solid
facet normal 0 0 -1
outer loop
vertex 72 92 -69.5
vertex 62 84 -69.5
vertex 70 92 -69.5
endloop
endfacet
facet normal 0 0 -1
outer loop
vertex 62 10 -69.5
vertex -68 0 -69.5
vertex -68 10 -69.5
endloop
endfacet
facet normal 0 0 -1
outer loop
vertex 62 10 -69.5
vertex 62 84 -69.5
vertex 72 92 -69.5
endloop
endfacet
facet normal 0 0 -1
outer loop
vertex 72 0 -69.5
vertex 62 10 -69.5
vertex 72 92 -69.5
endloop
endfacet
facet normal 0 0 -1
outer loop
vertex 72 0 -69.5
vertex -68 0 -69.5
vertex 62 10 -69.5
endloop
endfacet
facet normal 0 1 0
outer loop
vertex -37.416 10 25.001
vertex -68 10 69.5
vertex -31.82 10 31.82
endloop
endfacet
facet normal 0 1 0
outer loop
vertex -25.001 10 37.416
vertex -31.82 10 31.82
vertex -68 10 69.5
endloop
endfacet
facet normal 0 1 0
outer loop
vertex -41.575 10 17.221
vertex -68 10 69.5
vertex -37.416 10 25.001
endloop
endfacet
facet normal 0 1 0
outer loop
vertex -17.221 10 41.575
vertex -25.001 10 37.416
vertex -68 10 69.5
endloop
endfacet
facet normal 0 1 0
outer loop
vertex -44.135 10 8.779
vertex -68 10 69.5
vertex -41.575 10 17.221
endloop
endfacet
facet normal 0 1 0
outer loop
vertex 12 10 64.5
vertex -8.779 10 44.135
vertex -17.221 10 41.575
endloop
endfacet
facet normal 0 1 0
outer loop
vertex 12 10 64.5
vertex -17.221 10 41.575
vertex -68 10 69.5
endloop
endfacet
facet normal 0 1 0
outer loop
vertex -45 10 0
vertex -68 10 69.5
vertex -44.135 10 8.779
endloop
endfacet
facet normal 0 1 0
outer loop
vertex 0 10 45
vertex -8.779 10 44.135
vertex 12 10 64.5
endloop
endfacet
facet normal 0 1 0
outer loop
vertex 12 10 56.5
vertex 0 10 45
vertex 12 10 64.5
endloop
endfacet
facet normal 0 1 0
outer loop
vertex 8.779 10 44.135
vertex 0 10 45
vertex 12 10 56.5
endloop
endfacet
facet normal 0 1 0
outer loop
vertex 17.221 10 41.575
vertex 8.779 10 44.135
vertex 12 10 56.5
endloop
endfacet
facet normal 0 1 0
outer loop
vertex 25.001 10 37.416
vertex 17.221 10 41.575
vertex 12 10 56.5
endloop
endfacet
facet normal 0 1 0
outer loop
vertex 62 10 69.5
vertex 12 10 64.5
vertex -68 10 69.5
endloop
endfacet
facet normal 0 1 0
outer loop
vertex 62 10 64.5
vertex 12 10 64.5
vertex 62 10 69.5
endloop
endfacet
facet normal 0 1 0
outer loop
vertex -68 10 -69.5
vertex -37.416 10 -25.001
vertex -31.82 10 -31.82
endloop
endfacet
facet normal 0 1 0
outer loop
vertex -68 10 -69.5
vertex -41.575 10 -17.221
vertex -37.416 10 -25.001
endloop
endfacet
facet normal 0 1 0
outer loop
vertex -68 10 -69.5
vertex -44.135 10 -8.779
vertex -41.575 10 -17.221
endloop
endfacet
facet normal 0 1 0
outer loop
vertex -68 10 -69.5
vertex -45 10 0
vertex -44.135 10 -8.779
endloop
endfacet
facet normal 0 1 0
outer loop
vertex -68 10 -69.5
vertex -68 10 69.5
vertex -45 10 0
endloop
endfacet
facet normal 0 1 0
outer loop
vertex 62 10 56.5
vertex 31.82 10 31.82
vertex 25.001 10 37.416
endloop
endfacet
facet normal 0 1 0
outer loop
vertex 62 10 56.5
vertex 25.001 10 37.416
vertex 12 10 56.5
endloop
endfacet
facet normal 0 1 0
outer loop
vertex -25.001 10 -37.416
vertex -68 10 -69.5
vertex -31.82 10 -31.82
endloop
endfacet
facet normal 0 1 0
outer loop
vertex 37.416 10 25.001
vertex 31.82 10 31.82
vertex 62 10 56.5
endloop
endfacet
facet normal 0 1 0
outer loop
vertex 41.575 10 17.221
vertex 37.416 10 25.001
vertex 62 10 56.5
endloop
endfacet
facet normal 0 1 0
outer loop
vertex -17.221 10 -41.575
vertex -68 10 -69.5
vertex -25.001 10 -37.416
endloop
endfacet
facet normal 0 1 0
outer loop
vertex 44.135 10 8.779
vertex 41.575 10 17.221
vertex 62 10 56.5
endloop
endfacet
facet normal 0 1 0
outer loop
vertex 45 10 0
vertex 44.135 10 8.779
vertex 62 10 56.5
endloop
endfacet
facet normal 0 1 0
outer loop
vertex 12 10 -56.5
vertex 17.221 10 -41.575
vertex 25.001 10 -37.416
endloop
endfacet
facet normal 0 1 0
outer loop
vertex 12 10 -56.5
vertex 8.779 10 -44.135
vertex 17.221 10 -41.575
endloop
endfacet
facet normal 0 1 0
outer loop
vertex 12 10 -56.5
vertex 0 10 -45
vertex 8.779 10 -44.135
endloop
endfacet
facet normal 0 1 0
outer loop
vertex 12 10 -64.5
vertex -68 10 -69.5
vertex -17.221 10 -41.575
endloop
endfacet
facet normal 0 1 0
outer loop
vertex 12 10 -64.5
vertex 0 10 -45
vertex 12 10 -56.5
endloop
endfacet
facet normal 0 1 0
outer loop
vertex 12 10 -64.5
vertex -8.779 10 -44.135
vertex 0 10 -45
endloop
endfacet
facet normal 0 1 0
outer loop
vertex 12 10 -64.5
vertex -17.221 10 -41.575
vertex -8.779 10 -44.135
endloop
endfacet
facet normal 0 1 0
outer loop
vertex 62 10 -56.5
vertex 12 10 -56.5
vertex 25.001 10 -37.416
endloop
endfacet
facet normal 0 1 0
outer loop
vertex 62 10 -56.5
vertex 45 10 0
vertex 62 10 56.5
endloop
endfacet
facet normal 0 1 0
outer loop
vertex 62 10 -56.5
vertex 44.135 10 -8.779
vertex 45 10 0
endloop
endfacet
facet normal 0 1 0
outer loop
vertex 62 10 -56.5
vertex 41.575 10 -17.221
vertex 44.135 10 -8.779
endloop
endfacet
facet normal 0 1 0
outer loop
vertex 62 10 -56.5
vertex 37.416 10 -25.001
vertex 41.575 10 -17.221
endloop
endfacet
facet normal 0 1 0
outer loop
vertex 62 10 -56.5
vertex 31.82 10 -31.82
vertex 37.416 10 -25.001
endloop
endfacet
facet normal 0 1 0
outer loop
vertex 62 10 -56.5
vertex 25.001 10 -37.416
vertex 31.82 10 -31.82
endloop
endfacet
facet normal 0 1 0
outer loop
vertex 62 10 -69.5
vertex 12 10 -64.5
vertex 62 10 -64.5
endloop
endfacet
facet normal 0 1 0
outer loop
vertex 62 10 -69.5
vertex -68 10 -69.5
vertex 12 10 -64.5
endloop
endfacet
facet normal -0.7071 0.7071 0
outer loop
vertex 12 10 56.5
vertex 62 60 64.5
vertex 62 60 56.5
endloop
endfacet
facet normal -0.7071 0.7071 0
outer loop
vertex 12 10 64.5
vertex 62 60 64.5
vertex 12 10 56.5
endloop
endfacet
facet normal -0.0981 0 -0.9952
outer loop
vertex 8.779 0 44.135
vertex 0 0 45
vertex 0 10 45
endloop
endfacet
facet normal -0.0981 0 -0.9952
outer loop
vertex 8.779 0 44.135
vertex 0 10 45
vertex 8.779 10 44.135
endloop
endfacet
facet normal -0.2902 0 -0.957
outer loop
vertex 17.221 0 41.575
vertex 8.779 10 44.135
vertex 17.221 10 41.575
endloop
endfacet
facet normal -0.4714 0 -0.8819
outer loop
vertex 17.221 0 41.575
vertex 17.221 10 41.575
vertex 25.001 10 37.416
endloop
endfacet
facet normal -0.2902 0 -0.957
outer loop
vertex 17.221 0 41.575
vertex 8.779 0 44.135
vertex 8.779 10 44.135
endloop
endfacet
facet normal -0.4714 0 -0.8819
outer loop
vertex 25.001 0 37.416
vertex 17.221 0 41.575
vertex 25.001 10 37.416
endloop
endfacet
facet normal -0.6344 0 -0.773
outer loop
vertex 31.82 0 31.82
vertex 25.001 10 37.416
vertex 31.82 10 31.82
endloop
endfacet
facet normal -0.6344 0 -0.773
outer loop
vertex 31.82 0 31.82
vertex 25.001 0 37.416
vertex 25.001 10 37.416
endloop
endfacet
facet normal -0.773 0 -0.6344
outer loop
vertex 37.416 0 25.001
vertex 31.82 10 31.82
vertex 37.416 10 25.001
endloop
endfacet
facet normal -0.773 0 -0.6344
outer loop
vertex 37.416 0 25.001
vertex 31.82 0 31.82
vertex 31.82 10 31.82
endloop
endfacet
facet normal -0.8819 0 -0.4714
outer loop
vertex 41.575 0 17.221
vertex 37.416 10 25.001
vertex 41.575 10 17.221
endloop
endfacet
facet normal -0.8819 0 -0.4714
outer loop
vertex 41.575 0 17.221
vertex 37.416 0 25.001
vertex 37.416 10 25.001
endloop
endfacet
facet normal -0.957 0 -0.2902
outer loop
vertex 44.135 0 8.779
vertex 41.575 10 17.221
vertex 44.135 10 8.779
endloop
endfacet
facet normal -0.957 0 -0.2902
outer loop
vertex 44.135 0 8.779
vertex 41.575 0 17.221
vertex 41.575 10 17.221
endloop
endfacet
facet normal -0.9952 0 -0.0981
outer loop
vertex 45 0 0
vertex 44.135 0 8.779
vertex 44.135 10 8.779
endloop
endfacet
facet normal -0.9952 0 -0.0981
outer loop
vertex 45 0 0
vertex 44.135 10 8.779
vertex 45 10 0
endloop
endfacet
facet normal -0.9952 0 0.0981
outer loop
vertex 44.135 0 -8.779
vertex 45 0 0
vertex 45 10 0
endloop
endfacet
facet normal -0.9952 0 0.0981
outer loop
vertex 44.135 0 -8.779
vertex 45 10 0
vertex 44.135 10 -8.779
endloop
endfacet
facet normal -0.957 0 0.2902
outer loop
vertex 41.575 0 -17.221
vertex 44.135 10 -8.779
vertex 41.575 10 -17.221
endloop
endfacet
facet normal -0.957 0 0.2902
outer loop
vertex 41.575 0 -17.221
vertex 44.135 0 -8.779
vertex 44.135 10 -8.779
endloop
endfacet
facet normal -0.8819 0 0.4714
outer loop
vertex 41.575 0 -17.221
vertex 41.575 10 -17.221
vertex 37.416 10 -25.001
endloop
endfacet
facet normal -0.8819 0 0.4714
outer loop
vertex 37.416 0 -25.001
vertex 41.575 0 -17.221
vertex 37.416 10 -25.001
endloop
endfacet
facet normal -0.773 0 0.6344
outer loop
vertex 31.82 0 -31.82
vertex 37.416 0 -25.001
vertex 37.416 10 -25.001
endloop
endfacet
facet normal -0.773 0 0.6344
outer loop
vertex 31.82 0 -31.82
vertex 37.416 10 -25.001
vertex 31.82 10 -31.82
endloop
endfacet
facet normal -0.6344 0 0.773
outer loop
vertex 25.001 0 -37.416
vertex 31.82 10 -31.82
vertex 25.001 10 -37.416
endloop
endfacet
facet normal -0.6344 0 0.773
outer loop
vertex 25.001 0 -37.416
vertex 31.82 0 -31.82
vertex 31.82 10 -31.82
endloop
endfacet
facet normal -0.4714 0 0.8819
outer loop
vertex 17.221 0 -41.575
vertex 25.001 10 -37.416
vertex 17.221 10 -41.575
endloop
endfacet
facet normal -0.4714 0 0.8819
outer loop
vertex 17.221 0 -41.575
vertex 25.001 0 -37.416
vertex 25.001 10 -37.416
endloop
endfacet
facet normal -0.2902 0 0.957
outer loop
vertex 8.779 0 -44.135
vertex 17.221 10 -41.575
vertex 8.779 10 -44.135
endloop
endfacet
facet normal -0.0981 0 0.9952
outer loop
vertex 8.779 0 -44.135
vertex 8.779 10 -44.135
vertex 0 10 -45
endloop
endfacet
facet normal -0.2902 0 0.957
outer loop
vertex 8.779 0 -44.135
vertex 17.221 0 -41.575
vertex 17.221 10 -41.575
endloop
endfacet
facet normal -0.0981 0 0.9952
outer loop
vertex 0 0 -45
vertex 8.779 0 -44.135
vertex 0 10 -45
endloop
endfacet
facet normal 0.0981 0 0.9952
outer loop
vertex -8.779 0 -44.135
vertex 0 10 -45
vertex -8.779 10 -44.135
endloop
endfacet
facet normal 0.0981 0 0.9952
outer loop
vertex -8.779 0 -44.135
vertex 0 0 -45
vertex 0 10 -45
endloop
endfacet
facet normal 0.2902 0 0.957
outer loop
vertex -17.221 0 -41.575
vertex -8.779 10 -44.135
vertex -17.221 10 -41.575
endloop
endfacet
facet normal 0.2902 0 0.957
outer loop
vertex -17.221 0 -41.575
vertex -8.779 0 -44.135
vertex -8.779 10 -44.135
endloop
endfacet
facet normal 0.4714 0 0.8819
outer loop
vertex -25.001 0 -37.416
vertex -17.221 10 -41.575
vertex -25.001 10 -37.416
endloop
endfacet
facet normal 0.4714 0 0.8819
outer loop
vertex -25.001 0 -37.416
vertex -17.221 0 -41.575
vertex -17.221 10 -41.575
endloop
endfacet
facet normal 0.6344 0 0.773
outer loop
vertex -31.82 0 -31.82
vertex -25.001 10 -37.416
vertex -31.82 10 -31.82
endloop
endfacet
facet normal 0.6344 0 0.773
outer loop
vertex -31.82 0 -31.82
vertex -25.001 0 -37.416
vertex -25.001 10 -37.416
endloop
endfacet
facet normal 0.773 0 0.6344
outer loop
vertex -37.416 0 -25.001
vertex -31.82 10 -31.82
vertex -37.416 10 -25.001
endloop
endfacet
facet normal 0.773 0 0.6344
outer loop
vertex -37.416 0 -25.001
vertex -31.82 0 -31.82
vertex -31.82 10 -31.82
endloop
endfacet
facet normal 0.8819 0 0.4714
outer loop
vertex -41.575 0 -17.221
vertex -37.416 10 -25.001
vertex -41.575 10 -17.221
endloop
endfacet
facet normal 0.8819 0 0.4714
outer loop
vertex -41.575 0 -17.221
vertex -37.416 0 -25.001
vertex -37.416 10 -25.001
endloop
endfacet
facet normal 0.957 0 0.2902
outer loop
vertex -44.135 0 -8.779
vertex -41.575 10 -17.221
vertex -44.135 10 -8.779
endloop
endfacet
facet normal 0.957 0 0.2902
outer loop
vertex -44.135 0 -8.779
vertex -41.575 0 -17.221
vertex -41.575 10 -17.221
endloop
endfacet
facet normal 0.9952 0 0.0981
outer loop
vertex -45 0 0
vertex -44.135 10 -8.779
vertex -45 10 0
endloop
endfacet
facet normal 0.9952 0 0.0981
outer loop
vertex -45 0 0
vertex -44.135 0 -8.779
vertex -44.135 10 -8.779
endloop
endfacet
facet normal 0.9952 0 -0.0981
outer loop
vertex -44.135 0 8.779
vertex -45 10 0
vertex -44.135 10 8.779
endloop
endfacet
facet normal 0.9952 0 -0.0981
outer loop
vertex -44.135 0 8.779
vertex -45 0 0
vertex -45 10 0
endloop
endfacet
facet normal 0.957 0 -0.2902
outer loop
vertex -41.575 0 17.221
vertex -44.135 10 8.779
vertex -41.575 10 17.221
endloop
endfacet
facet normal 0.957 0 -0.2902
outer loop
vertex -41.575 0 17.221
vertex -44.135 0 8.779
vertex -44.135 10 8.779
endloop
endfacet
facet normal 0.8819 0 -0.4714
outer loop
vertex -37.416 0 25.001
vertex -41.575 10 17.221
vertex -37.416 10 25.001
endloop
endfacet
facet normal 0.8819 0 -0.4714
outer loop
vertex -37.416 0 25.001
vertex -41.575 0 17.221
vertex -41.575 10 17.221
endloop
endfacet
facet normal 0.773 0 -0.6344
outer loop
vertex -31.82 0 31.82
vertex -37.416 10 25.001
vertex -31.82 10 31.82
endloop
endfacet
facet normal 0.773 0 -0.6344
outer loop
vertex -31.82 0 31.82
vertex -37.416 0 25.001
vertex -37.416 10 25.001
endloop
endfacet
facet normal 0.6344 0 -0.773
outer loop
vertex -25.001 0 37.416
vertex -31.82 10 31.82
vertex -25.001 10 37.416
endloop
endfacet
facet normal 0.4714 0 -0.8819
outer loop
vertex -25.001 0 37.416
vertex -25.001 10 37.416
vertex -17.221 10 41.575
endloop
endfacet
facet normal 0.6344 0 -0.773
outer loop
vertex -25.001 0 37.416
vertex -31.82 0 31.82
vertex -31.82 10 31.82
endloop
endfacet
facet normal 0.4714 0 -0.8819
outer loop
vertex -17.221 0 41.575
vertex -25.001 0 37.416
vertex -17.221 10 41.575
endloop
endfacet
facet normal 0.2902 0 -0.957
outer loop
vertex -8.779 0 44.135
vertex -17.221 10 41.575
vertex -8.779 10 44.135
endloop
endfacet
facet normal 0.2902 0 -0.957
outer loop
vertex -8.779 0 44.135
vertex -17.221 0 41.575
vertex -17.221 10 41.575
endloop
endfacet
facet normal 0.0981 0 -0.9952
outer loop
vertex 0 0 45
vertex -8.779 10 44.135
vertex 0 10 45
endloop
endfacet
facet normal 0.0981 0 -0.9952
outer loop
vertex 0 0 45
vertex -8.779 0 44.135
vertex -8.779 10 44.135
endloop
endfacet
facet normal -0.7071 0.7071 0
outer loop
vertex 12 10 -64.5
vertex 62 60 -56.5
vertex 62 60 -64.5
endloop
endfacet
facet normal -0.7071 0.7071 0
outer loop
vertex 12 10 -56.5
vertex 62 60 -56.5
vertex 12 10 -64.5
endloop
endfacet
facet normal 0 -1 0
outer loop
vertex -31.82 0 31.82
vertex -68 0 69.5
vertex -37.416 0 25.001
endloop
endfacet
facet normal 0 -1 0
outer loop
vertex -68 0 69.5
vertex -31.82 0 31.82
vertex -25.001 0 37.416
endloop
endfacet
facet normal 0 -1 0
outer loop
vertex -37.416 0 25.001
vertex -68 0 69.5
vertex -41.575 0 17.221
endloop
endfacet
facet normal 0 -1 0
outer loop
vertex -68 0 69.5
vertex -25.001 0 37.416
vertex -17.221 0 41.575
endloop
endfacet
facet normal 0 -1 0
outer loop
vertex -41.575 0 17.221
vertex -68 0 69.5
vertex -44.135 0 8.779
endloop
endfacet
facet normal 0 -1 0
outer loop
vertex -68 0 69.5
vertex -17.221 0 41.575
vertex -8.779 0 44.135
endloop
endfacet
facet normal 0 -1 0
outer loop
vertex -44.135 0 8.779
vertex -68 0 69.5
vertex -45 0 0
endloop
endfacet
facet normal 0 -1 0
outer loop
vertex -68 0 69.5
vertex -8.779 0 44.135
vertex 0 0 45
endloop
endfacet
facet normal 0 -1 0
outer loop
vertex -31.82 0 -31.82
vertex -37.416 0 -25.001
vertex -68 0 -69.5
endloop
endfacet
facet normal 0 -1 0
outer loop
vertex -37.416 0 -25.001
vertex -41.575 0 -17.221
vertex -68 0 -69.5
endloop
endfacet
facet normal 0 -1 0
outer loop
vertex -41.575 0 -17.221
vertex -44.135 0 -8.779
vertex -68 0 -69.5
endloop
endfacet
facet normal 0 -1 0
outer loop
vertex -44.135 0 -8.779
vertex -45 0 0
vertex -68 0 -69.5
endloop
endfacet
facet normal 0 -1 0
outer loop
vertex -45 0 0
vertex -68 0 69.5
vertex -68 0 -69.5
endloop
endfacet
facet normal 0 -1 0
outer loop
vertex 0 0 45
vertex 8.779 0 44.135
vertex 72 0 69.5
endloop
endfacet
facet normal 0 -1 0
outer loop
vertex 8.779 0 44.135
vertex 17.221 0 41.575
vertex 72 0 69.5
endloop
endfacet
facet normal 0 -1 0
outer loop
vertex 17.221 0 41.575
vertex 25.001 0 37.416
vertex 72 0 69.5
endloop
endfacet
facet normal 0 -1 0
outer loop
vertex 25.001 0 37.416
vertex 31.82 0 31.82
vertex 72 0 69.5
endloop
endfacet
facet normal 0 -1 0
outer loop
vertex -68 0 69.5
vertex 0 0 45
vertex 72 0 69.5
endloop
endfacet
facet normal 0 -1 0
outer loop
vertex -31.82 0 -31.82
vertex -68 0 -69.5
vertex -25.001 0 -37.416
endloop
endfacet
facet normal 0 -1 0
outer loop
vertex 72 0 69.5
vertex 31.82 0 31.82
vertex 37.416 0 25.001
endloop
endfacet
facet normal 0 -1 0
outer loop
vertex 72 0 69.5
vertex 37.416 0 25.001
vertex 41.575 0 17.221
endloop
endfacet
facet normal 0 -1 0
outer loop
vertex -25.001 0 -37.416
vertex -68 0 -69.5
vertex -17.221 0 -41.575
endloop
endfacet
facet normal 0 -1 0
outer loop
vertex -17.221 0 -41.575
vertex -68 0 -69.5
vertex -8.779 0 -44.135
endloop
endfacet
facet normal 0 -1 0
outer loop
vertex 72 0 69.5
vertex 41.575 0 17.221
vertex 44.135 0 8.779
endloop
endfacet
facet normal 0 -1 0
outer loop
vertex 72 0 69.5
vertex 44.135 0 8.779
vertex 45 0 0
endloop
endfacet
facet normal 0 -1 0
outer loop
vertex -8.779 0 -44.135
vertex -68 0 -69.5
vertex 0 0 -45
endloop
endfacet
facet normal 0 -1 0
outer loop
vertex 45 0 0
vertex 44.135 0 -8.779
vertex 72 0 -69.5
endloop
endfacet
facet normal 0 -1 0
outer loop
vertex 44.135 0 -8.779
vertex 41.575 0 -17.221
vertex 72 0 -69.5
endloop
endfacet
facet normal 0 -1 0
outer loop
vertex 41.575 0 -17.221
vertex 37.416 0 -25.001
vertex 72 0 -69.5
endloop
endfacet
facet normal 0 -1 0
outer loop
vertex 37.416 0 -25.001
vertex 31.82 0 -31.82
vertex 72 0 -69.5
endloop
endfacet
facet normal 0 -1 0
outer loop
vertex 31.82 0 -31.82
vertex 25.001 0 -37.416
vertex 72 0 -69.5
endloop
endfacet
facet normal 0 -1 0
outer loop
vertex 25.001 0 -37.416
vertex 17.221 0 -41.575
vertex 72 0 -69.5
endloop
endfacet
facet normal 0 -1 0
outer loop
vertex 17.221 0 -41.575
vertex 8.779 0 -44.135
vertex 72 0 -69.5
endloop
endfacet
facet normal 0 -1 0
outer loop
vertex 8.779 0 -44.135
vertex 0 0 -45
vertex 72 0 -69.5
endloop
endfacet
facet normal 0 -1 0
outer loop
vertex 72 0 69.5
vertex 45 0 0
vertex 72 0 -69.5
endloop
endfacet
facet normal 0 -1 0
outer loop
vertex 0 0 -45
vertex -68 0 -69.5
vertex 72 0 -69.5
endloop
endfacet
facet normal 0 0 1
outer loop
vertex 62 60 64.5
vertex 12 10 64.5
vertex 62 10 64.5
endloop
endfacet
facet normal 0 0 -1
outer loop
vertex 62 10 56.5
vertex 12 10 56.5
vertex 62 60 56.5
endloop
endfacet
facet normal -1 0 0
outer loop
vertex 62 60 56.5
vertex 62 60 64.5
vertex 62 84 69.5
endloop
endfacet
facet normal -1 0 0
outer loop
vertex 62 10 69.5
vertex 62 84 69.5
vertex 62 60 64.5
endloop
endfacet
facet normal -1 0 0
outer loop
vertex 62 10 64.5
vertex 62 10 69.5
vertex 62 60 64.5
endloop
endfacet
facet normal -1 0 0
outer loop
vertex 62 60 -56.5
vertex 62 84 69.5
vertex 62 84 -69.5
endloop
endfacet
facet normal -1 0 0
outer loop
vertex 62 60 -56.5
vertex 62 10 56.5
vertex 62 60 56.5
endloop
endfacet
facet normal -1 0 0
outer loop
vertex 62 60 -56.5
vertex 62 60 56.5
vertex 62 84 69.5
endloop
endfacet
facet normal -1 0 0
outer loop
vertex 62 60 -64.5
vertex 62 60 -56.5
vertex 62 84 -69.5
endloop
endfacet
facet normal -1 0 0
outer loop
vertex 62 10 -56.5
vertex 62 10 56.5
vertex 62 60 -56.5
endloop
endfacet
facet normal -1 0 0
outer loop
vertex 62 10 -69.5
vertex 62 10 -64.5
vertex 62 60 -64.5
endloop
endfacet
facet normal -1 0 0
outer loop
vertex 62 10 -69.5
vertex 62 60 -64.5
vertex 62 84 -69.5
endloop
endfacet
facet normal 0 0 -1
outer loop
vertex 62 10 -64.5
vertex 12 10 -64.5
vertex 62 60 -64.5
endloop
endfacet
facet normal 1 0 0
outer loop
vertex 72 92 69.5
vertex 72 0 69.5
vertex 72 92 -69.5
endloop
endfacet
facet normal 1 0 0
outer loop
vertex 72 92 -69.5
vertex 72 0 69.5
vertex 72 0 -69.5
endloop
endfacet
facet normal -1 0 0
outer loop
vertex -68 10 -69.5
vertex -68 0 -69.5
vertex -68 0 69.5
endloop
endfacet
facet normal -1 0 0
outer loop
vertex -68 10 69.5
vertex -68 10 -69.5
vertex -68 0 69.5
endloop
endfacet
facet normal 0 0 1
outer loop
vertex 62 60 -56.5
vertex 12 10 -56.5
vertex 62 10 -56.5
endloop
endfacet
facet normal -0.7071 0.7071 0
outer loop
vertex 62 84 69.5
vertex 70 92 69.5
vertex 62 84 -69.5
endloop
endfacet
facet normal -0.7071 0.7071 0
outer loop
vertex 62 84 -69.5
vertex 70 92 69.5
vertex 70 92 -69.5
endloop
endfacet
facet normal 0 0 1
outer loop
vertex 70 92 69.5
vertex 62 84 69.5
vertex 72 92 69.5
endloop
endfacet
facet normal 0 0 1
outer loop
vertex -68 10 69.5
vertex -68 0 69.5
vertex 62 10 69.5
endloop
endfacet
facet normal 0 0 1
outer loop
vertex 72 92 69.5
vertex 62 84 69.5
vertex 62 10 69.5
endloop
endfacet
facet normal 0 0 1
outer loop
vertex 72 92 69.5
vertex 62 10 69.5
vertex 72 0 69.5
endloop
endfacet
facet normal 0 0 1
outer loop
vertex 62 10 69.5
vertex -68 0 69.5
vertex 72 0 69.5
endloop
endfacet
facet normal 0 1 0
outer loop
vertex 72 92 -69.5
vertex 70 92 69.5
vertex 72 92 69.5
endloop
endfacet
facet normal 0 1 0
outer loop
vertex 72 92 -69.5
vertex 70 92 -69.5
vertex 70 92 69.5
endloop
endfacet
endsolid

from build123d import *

# Parameters (mm, degrees)
SKETCH1_R       = 45
EXTRUDE1_DEPTH  = 10
SKETCH2_W       = 10
SKETCH2_H       = 139
EXTRUDE2_DEPTH  = 82
CHAMFER1_SIZE   = 8
EXTRUDE3_START  = -5
EXTRUDE3_DEPTH  = 8
LPATTERN1_COUNT = 2
LPATTERN1_PITCH = 121


with BuildPart() as part:
    # Sketch1 → Extrude1 (new body)
    with BuildSketch(Plane(origin=(0, 0, 0), x_dir=(1, 0, 0), z_dir=(0, 1, 0))):
        Polygon((0, 69.5), (-68, 69.5), (-68, -69.5), (0, -69.5), (72, -69.5), (72, 69.5), align=None)
        with Locations(Location((0, 0, 0), (0, 0, 270))):
            Circle(SKETCH1_R, mode=Mode.SUBTRACT)
    extrude(amount=EXTRUDE1_DEPTH)

    # Sketch2 → Extrude2 (add)
    with BuildSketch(Plane(origin=(0, 10, 0), x_dir=(1, 0, 0), z_dir=(0, 1, 0))):
        with Locations((67, 0)):
            Rectangle(SKETCH2_W, SKETCH2_H)
    extrude(amount=EXTRUDE2_DEPTH)

    # Chamfer1
    chamfer1_edges = [part.edges().sort_by_distance(p)[0] for p in [
        (62, 92, 0),
    ]]
    chamfer(chamfer1_edges, length=CHAMFER1_SIZE)

    # Sketch3 → Extrude3 (add)
    with BuildSketch(Plane.XY.offset(69.5).offset(EXTRUDE3_START)):
        Polygon((12, 10), (62, 10), (62, 60), align=None)
    extrude3 = extrude(amount=-EXTRUDE3_DEPTH)

    # LPattern1: Extrude3 ×2
    with Locations(*[(0, 0, -i * LPATTERN1_PITCH) for i in range(1, LPATTERN1_COUNT)]):
        add(extrude3)


solid = part.part
